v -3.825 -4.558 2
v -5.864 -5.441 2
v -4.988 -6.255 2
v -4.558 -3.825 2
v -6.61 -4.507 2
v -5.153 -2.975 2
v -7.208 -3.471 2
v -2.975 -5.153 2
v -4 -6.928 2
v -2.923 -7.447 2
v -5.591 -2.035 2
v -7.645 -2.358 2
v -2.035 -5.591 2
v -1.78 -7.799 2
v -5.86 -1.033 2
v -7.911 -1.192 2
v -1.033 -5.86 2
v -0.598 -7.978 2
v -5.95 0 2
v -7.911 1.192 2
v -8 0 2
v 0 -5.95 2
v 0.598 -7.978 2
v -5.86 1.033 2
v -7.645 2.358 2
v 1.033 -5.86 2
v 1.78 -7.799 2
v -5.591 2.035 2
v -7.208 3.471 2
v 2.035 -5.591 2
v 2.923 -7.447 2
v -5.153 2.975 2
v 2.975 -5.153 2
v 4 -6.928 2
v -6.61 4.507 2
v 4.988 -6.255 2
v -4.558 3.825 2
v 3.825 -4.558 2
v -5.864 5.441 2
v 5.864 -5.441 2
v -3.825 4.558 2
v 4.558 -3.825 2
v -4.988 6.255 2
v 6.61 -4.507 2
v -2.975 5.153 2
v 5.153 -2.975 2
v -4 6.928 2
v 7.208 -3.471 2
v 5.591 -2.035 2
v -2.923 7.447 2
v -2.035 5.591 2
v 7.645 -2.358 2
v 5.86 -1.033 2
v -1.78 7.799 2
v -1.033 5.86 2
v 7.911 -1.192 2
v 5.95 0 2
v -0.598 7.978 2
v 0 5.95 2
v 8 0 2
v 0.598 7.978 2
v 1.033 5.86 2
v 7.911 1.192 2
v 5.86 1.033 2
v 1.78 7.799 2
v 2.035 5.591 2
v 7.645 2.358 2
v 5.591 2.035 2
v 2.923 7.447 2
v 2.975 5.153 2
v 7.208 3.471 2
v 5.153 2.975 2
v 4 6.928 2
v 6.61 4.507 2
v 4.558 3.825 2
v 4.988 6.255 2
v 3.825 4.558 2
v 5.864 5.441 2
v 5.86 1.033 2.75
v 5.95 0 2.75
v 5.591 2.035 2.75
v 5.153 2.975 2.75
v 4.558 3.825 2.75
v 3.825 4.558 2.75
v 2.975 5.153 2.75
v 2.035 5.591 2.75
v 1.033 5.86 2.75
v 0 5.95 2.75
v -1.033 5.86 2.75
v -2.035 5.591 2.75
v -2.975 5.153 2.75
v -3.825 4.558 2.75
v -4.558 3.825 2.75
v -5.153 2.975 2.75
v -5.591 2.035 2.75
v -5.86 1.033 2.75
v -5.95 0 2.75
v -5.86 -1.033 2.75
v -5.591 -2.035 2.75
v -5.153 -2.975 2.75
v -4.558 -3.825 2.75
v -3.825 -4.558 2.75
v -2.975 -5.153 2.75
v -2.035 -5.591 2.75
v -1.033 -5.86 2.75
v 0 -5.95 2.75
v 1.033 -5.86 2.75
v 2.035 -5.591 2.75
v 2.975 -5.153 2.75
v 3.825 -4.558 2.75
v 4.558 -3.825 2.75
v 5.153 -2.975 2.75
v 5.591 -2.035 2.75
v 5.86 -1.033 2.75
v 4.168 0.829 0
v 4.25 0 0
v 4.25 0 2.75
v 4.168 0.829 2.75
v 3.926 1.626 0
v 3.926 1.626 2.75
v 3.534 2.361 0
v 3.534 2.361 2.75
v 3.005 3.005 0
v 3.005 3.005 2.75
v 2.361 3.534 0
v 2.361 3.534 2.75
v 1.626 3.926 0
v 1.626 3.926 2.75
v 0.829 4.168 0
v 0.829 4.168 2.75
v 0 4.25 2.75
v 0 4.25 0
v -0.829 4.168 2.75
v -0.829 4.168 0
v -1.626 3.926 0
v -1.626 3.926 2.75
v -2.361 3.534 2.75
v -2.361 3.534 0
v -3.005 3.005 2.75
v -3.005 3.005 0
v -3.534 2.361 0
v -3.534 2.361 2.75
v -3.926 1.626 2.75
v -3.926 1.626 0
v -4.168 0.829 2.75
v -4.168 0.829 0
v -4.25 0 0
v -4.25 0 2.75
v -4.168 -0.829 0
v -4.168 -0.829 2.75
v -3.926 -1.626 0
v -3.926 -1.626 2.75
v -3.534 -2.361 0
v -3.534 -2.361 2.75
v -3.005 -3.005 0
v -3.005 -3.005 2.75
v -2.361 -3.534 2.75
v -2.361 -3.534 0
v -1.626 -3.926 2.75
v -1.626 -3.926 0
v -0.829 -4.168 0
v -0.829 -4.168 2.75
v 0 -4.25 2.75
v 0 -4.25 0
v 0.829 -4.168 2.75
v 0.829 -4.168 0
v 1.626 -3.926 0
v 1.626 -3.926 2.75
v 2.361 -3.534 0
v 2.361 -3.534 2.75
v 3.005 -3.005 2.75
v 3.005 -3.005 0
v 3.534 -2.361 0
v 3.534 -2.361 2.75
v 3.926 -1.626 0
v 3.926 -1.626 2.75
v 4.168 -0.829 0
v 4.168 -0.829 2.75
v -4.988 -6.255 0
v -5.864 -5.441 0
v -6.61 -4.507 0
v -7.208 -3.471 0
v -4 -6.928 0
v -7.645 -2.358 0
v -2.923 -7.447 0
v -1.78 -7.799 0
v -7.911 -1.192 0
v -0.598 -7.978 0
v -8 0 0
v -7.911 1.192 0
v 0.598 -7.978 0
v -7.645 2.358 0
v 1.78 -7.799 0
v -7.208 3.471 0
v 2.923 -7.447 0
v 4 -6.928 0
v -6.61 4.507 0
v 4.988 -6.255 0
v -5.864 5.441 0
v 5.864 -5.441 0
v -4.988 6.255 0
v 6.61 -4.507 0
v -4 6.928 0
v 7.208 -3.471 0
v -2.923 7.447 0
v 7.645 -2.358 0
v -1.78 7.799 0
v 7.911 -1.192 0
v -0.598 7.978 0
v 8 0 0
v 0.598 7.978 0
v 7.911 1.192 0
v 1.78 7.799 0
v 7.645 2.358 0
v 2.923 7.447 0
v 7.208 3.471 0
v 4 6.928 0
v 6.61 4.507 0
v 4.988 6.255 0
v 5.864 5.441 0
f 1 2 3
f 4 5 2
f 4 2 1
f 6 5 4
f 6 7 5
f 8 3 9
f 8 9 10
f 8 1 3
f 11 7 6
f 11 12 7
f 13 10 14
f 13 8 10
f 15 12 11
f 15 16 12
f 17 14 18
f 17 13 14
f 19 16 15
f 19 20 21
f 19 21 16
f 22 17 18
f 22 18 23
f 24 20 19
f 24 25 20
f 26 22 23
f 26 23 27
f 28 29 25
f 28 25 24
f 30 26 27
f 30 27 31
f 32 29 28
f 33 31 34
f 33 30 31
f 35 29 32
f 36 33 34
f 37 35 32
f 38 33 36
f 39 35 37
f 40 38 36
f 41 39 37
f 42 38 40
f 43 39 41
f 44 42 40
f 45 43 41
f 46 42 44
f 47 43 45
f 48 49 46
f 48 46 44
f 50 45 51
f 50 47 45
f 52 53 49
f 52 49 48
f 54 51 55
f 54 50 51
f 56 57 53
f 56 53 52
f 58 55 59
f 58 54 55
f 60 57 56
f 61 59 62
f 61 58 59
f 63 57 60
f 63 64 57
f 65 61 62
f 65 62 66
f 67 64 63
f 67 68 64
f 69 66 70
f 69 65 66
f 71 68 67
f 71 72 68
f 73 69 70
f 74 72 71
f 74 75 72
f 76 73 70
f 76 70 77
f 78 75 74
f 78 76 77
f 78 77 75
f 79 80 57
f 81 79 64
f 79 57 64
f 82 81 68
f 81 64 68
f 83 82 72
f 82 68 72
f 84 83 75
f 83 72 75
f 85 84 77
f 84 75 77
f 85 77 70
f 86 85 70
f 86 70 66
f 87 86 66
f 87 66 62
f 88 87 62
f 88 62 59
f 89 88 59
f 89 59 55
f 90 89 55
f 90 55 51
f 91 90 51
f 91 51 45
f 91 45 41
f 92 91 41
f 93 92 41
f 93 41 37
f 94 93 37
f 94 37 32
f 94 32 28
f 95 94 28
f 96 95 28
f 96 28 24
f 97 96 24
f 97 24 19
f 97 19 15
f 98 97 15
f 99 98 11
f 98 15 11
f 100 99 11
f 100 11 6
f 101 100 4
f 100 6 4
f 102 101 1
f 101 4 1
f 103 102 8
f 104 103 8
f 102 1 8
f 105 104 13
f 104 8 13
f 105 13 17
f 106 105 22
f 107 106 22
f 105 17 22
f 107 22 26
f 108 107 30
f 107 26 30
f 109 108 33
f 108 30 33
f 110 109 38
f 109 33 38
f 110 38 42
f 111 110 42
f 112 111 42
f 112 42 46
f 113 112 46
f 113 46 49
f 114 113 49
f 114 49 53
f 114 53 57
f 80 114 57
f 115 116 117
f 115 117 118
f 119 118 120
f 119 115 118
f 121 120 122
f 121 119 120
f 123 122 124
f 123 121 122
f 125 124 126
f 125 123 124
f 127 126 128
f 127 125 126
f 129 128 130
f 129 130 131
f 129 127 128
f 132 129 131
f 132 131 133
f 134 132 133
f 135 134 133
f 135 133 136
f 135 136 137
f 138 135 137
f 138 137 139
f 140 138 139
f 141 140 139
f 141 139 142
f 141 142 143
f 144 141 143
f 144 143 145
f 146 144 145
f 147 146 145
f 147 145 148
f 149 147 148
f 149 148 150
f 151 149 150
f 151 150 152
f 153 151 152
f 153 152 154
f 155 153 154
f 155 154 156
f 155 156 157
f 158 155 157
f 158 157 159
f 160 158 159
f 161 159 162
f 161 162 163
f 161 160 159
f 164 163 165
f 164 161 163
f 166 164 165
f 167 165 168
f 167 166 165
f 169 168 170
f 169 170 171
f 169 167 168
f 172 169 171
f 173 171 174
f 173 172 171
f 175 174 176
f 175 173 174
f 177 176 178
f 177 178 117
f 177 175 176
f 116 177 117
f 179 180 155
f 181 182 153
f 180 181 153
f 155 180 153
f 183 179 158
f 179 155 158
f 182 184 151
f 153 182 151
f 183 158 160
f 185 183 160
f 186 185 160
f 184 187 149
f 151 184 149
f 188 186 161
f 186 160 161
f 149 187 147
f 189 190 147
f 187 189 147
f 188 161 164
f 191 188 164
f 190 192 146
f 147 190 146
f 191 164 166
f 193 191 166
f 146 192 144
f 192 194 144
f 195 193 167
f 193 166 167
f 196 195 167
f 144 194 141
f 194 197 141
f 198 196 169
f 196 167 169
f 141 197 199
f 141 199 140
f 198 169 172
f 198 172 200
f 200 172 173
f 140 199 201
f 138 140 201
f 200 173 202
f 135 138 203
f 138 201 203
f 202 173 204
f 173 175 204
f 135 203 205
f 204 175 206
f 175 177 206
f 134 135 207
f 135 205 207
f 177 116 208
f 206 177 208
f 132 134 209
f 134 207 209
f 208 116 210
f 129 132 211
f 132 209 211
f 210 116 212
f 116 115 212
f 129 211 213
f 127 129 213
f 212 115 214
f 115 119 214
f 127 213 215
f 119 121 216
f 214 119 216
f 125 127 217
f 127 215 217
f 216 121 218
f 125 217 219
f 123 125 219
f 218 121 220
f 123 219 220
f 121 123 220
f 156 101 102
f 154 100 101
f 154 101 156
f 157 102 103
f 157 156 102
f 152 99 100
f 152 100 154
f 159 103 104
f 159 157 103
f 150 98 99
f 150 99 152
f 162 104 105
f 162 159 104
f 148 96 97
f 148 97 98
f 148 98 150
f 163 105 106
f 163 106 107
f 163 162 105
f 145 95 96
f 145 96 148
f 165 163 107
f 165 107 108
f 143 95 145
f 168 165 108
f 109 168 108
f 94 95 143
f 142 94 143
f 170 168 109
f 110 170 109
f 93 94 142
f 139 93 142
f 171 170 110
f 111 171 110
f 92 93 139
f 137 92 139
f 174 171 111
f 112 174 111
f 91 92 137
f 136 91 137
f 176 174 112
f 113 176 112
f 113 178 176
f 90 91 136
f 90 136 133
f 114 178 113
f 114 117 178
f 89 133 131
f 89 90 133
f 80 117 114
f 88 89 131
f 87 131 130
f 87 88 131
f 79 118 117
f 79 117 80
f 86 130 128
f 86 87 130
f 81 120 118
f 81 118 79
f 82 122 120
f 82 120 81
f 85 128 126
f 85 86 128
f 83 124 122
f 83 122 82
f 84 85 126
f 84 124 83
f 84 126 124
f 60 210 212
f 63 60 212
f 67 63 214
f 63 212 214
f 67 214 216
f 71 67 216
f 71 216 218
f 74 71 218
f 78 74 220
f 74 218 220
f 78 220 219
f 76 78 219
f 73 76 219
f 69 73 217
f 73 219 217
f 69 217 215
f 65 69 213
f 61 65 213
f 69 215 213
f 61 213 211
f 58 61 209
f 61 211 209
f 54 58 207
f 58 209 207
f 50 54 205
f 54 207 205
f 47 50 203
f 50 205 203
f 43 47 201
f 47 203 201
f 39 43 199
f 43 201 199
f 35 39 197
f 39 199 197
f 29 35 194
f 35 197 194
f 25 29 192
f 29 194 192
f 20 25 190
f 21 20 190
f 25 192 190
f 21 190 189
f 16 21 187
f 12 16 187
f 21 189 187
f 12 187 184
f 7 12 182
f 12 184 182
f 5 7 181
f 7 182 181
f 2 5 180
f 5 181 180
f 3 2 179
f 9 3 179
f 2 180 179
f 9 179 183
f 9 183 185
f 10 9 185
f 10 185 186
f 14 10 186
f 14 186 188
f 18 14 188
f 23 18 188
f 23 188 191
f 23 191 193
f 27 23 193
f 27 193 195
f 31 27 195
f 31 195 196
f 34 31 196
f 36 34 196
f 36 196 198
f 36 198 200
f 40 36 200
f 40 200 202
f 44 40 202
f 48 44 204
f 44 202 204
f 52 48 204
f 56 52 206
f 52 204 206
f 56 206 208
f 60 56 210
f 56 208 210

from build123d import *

# Parameters (mm, degrees)
SKETCH001_R      = 8
SKETCH001_R_2    = 4.25
EXTRUDE001_DEPTH = 2
SKETCH_R         = 5.95
SKETCH_R_2       = 4.25
EXTRUDE_DEPTH    = 2.75


with BuildPart() as extrude001:
    # Sketch001 → Extrude001 (new body)
    with BuildSketch(Plane.XY):
        Circle(SKETCH001_R)
        Circle(SKETCH001_R_2, mode=Mode.SUBTRACT)
    extrude(amount=EXTRUDE001_DEPTH)


with BuildPart() as fusion:
    # Sketch → Extrude (new body)
    with BuildSketch(Plane.XY):
        Circle(SKETCH_R)
        Circle(SKETCH_R_2, mode=Mode.SUBTRACT)
    extrude(amount=EXTRUDE_DEPTH)

    # Fusion: union Extrude001
    add(extrude001.part)


solid = fusion.part
